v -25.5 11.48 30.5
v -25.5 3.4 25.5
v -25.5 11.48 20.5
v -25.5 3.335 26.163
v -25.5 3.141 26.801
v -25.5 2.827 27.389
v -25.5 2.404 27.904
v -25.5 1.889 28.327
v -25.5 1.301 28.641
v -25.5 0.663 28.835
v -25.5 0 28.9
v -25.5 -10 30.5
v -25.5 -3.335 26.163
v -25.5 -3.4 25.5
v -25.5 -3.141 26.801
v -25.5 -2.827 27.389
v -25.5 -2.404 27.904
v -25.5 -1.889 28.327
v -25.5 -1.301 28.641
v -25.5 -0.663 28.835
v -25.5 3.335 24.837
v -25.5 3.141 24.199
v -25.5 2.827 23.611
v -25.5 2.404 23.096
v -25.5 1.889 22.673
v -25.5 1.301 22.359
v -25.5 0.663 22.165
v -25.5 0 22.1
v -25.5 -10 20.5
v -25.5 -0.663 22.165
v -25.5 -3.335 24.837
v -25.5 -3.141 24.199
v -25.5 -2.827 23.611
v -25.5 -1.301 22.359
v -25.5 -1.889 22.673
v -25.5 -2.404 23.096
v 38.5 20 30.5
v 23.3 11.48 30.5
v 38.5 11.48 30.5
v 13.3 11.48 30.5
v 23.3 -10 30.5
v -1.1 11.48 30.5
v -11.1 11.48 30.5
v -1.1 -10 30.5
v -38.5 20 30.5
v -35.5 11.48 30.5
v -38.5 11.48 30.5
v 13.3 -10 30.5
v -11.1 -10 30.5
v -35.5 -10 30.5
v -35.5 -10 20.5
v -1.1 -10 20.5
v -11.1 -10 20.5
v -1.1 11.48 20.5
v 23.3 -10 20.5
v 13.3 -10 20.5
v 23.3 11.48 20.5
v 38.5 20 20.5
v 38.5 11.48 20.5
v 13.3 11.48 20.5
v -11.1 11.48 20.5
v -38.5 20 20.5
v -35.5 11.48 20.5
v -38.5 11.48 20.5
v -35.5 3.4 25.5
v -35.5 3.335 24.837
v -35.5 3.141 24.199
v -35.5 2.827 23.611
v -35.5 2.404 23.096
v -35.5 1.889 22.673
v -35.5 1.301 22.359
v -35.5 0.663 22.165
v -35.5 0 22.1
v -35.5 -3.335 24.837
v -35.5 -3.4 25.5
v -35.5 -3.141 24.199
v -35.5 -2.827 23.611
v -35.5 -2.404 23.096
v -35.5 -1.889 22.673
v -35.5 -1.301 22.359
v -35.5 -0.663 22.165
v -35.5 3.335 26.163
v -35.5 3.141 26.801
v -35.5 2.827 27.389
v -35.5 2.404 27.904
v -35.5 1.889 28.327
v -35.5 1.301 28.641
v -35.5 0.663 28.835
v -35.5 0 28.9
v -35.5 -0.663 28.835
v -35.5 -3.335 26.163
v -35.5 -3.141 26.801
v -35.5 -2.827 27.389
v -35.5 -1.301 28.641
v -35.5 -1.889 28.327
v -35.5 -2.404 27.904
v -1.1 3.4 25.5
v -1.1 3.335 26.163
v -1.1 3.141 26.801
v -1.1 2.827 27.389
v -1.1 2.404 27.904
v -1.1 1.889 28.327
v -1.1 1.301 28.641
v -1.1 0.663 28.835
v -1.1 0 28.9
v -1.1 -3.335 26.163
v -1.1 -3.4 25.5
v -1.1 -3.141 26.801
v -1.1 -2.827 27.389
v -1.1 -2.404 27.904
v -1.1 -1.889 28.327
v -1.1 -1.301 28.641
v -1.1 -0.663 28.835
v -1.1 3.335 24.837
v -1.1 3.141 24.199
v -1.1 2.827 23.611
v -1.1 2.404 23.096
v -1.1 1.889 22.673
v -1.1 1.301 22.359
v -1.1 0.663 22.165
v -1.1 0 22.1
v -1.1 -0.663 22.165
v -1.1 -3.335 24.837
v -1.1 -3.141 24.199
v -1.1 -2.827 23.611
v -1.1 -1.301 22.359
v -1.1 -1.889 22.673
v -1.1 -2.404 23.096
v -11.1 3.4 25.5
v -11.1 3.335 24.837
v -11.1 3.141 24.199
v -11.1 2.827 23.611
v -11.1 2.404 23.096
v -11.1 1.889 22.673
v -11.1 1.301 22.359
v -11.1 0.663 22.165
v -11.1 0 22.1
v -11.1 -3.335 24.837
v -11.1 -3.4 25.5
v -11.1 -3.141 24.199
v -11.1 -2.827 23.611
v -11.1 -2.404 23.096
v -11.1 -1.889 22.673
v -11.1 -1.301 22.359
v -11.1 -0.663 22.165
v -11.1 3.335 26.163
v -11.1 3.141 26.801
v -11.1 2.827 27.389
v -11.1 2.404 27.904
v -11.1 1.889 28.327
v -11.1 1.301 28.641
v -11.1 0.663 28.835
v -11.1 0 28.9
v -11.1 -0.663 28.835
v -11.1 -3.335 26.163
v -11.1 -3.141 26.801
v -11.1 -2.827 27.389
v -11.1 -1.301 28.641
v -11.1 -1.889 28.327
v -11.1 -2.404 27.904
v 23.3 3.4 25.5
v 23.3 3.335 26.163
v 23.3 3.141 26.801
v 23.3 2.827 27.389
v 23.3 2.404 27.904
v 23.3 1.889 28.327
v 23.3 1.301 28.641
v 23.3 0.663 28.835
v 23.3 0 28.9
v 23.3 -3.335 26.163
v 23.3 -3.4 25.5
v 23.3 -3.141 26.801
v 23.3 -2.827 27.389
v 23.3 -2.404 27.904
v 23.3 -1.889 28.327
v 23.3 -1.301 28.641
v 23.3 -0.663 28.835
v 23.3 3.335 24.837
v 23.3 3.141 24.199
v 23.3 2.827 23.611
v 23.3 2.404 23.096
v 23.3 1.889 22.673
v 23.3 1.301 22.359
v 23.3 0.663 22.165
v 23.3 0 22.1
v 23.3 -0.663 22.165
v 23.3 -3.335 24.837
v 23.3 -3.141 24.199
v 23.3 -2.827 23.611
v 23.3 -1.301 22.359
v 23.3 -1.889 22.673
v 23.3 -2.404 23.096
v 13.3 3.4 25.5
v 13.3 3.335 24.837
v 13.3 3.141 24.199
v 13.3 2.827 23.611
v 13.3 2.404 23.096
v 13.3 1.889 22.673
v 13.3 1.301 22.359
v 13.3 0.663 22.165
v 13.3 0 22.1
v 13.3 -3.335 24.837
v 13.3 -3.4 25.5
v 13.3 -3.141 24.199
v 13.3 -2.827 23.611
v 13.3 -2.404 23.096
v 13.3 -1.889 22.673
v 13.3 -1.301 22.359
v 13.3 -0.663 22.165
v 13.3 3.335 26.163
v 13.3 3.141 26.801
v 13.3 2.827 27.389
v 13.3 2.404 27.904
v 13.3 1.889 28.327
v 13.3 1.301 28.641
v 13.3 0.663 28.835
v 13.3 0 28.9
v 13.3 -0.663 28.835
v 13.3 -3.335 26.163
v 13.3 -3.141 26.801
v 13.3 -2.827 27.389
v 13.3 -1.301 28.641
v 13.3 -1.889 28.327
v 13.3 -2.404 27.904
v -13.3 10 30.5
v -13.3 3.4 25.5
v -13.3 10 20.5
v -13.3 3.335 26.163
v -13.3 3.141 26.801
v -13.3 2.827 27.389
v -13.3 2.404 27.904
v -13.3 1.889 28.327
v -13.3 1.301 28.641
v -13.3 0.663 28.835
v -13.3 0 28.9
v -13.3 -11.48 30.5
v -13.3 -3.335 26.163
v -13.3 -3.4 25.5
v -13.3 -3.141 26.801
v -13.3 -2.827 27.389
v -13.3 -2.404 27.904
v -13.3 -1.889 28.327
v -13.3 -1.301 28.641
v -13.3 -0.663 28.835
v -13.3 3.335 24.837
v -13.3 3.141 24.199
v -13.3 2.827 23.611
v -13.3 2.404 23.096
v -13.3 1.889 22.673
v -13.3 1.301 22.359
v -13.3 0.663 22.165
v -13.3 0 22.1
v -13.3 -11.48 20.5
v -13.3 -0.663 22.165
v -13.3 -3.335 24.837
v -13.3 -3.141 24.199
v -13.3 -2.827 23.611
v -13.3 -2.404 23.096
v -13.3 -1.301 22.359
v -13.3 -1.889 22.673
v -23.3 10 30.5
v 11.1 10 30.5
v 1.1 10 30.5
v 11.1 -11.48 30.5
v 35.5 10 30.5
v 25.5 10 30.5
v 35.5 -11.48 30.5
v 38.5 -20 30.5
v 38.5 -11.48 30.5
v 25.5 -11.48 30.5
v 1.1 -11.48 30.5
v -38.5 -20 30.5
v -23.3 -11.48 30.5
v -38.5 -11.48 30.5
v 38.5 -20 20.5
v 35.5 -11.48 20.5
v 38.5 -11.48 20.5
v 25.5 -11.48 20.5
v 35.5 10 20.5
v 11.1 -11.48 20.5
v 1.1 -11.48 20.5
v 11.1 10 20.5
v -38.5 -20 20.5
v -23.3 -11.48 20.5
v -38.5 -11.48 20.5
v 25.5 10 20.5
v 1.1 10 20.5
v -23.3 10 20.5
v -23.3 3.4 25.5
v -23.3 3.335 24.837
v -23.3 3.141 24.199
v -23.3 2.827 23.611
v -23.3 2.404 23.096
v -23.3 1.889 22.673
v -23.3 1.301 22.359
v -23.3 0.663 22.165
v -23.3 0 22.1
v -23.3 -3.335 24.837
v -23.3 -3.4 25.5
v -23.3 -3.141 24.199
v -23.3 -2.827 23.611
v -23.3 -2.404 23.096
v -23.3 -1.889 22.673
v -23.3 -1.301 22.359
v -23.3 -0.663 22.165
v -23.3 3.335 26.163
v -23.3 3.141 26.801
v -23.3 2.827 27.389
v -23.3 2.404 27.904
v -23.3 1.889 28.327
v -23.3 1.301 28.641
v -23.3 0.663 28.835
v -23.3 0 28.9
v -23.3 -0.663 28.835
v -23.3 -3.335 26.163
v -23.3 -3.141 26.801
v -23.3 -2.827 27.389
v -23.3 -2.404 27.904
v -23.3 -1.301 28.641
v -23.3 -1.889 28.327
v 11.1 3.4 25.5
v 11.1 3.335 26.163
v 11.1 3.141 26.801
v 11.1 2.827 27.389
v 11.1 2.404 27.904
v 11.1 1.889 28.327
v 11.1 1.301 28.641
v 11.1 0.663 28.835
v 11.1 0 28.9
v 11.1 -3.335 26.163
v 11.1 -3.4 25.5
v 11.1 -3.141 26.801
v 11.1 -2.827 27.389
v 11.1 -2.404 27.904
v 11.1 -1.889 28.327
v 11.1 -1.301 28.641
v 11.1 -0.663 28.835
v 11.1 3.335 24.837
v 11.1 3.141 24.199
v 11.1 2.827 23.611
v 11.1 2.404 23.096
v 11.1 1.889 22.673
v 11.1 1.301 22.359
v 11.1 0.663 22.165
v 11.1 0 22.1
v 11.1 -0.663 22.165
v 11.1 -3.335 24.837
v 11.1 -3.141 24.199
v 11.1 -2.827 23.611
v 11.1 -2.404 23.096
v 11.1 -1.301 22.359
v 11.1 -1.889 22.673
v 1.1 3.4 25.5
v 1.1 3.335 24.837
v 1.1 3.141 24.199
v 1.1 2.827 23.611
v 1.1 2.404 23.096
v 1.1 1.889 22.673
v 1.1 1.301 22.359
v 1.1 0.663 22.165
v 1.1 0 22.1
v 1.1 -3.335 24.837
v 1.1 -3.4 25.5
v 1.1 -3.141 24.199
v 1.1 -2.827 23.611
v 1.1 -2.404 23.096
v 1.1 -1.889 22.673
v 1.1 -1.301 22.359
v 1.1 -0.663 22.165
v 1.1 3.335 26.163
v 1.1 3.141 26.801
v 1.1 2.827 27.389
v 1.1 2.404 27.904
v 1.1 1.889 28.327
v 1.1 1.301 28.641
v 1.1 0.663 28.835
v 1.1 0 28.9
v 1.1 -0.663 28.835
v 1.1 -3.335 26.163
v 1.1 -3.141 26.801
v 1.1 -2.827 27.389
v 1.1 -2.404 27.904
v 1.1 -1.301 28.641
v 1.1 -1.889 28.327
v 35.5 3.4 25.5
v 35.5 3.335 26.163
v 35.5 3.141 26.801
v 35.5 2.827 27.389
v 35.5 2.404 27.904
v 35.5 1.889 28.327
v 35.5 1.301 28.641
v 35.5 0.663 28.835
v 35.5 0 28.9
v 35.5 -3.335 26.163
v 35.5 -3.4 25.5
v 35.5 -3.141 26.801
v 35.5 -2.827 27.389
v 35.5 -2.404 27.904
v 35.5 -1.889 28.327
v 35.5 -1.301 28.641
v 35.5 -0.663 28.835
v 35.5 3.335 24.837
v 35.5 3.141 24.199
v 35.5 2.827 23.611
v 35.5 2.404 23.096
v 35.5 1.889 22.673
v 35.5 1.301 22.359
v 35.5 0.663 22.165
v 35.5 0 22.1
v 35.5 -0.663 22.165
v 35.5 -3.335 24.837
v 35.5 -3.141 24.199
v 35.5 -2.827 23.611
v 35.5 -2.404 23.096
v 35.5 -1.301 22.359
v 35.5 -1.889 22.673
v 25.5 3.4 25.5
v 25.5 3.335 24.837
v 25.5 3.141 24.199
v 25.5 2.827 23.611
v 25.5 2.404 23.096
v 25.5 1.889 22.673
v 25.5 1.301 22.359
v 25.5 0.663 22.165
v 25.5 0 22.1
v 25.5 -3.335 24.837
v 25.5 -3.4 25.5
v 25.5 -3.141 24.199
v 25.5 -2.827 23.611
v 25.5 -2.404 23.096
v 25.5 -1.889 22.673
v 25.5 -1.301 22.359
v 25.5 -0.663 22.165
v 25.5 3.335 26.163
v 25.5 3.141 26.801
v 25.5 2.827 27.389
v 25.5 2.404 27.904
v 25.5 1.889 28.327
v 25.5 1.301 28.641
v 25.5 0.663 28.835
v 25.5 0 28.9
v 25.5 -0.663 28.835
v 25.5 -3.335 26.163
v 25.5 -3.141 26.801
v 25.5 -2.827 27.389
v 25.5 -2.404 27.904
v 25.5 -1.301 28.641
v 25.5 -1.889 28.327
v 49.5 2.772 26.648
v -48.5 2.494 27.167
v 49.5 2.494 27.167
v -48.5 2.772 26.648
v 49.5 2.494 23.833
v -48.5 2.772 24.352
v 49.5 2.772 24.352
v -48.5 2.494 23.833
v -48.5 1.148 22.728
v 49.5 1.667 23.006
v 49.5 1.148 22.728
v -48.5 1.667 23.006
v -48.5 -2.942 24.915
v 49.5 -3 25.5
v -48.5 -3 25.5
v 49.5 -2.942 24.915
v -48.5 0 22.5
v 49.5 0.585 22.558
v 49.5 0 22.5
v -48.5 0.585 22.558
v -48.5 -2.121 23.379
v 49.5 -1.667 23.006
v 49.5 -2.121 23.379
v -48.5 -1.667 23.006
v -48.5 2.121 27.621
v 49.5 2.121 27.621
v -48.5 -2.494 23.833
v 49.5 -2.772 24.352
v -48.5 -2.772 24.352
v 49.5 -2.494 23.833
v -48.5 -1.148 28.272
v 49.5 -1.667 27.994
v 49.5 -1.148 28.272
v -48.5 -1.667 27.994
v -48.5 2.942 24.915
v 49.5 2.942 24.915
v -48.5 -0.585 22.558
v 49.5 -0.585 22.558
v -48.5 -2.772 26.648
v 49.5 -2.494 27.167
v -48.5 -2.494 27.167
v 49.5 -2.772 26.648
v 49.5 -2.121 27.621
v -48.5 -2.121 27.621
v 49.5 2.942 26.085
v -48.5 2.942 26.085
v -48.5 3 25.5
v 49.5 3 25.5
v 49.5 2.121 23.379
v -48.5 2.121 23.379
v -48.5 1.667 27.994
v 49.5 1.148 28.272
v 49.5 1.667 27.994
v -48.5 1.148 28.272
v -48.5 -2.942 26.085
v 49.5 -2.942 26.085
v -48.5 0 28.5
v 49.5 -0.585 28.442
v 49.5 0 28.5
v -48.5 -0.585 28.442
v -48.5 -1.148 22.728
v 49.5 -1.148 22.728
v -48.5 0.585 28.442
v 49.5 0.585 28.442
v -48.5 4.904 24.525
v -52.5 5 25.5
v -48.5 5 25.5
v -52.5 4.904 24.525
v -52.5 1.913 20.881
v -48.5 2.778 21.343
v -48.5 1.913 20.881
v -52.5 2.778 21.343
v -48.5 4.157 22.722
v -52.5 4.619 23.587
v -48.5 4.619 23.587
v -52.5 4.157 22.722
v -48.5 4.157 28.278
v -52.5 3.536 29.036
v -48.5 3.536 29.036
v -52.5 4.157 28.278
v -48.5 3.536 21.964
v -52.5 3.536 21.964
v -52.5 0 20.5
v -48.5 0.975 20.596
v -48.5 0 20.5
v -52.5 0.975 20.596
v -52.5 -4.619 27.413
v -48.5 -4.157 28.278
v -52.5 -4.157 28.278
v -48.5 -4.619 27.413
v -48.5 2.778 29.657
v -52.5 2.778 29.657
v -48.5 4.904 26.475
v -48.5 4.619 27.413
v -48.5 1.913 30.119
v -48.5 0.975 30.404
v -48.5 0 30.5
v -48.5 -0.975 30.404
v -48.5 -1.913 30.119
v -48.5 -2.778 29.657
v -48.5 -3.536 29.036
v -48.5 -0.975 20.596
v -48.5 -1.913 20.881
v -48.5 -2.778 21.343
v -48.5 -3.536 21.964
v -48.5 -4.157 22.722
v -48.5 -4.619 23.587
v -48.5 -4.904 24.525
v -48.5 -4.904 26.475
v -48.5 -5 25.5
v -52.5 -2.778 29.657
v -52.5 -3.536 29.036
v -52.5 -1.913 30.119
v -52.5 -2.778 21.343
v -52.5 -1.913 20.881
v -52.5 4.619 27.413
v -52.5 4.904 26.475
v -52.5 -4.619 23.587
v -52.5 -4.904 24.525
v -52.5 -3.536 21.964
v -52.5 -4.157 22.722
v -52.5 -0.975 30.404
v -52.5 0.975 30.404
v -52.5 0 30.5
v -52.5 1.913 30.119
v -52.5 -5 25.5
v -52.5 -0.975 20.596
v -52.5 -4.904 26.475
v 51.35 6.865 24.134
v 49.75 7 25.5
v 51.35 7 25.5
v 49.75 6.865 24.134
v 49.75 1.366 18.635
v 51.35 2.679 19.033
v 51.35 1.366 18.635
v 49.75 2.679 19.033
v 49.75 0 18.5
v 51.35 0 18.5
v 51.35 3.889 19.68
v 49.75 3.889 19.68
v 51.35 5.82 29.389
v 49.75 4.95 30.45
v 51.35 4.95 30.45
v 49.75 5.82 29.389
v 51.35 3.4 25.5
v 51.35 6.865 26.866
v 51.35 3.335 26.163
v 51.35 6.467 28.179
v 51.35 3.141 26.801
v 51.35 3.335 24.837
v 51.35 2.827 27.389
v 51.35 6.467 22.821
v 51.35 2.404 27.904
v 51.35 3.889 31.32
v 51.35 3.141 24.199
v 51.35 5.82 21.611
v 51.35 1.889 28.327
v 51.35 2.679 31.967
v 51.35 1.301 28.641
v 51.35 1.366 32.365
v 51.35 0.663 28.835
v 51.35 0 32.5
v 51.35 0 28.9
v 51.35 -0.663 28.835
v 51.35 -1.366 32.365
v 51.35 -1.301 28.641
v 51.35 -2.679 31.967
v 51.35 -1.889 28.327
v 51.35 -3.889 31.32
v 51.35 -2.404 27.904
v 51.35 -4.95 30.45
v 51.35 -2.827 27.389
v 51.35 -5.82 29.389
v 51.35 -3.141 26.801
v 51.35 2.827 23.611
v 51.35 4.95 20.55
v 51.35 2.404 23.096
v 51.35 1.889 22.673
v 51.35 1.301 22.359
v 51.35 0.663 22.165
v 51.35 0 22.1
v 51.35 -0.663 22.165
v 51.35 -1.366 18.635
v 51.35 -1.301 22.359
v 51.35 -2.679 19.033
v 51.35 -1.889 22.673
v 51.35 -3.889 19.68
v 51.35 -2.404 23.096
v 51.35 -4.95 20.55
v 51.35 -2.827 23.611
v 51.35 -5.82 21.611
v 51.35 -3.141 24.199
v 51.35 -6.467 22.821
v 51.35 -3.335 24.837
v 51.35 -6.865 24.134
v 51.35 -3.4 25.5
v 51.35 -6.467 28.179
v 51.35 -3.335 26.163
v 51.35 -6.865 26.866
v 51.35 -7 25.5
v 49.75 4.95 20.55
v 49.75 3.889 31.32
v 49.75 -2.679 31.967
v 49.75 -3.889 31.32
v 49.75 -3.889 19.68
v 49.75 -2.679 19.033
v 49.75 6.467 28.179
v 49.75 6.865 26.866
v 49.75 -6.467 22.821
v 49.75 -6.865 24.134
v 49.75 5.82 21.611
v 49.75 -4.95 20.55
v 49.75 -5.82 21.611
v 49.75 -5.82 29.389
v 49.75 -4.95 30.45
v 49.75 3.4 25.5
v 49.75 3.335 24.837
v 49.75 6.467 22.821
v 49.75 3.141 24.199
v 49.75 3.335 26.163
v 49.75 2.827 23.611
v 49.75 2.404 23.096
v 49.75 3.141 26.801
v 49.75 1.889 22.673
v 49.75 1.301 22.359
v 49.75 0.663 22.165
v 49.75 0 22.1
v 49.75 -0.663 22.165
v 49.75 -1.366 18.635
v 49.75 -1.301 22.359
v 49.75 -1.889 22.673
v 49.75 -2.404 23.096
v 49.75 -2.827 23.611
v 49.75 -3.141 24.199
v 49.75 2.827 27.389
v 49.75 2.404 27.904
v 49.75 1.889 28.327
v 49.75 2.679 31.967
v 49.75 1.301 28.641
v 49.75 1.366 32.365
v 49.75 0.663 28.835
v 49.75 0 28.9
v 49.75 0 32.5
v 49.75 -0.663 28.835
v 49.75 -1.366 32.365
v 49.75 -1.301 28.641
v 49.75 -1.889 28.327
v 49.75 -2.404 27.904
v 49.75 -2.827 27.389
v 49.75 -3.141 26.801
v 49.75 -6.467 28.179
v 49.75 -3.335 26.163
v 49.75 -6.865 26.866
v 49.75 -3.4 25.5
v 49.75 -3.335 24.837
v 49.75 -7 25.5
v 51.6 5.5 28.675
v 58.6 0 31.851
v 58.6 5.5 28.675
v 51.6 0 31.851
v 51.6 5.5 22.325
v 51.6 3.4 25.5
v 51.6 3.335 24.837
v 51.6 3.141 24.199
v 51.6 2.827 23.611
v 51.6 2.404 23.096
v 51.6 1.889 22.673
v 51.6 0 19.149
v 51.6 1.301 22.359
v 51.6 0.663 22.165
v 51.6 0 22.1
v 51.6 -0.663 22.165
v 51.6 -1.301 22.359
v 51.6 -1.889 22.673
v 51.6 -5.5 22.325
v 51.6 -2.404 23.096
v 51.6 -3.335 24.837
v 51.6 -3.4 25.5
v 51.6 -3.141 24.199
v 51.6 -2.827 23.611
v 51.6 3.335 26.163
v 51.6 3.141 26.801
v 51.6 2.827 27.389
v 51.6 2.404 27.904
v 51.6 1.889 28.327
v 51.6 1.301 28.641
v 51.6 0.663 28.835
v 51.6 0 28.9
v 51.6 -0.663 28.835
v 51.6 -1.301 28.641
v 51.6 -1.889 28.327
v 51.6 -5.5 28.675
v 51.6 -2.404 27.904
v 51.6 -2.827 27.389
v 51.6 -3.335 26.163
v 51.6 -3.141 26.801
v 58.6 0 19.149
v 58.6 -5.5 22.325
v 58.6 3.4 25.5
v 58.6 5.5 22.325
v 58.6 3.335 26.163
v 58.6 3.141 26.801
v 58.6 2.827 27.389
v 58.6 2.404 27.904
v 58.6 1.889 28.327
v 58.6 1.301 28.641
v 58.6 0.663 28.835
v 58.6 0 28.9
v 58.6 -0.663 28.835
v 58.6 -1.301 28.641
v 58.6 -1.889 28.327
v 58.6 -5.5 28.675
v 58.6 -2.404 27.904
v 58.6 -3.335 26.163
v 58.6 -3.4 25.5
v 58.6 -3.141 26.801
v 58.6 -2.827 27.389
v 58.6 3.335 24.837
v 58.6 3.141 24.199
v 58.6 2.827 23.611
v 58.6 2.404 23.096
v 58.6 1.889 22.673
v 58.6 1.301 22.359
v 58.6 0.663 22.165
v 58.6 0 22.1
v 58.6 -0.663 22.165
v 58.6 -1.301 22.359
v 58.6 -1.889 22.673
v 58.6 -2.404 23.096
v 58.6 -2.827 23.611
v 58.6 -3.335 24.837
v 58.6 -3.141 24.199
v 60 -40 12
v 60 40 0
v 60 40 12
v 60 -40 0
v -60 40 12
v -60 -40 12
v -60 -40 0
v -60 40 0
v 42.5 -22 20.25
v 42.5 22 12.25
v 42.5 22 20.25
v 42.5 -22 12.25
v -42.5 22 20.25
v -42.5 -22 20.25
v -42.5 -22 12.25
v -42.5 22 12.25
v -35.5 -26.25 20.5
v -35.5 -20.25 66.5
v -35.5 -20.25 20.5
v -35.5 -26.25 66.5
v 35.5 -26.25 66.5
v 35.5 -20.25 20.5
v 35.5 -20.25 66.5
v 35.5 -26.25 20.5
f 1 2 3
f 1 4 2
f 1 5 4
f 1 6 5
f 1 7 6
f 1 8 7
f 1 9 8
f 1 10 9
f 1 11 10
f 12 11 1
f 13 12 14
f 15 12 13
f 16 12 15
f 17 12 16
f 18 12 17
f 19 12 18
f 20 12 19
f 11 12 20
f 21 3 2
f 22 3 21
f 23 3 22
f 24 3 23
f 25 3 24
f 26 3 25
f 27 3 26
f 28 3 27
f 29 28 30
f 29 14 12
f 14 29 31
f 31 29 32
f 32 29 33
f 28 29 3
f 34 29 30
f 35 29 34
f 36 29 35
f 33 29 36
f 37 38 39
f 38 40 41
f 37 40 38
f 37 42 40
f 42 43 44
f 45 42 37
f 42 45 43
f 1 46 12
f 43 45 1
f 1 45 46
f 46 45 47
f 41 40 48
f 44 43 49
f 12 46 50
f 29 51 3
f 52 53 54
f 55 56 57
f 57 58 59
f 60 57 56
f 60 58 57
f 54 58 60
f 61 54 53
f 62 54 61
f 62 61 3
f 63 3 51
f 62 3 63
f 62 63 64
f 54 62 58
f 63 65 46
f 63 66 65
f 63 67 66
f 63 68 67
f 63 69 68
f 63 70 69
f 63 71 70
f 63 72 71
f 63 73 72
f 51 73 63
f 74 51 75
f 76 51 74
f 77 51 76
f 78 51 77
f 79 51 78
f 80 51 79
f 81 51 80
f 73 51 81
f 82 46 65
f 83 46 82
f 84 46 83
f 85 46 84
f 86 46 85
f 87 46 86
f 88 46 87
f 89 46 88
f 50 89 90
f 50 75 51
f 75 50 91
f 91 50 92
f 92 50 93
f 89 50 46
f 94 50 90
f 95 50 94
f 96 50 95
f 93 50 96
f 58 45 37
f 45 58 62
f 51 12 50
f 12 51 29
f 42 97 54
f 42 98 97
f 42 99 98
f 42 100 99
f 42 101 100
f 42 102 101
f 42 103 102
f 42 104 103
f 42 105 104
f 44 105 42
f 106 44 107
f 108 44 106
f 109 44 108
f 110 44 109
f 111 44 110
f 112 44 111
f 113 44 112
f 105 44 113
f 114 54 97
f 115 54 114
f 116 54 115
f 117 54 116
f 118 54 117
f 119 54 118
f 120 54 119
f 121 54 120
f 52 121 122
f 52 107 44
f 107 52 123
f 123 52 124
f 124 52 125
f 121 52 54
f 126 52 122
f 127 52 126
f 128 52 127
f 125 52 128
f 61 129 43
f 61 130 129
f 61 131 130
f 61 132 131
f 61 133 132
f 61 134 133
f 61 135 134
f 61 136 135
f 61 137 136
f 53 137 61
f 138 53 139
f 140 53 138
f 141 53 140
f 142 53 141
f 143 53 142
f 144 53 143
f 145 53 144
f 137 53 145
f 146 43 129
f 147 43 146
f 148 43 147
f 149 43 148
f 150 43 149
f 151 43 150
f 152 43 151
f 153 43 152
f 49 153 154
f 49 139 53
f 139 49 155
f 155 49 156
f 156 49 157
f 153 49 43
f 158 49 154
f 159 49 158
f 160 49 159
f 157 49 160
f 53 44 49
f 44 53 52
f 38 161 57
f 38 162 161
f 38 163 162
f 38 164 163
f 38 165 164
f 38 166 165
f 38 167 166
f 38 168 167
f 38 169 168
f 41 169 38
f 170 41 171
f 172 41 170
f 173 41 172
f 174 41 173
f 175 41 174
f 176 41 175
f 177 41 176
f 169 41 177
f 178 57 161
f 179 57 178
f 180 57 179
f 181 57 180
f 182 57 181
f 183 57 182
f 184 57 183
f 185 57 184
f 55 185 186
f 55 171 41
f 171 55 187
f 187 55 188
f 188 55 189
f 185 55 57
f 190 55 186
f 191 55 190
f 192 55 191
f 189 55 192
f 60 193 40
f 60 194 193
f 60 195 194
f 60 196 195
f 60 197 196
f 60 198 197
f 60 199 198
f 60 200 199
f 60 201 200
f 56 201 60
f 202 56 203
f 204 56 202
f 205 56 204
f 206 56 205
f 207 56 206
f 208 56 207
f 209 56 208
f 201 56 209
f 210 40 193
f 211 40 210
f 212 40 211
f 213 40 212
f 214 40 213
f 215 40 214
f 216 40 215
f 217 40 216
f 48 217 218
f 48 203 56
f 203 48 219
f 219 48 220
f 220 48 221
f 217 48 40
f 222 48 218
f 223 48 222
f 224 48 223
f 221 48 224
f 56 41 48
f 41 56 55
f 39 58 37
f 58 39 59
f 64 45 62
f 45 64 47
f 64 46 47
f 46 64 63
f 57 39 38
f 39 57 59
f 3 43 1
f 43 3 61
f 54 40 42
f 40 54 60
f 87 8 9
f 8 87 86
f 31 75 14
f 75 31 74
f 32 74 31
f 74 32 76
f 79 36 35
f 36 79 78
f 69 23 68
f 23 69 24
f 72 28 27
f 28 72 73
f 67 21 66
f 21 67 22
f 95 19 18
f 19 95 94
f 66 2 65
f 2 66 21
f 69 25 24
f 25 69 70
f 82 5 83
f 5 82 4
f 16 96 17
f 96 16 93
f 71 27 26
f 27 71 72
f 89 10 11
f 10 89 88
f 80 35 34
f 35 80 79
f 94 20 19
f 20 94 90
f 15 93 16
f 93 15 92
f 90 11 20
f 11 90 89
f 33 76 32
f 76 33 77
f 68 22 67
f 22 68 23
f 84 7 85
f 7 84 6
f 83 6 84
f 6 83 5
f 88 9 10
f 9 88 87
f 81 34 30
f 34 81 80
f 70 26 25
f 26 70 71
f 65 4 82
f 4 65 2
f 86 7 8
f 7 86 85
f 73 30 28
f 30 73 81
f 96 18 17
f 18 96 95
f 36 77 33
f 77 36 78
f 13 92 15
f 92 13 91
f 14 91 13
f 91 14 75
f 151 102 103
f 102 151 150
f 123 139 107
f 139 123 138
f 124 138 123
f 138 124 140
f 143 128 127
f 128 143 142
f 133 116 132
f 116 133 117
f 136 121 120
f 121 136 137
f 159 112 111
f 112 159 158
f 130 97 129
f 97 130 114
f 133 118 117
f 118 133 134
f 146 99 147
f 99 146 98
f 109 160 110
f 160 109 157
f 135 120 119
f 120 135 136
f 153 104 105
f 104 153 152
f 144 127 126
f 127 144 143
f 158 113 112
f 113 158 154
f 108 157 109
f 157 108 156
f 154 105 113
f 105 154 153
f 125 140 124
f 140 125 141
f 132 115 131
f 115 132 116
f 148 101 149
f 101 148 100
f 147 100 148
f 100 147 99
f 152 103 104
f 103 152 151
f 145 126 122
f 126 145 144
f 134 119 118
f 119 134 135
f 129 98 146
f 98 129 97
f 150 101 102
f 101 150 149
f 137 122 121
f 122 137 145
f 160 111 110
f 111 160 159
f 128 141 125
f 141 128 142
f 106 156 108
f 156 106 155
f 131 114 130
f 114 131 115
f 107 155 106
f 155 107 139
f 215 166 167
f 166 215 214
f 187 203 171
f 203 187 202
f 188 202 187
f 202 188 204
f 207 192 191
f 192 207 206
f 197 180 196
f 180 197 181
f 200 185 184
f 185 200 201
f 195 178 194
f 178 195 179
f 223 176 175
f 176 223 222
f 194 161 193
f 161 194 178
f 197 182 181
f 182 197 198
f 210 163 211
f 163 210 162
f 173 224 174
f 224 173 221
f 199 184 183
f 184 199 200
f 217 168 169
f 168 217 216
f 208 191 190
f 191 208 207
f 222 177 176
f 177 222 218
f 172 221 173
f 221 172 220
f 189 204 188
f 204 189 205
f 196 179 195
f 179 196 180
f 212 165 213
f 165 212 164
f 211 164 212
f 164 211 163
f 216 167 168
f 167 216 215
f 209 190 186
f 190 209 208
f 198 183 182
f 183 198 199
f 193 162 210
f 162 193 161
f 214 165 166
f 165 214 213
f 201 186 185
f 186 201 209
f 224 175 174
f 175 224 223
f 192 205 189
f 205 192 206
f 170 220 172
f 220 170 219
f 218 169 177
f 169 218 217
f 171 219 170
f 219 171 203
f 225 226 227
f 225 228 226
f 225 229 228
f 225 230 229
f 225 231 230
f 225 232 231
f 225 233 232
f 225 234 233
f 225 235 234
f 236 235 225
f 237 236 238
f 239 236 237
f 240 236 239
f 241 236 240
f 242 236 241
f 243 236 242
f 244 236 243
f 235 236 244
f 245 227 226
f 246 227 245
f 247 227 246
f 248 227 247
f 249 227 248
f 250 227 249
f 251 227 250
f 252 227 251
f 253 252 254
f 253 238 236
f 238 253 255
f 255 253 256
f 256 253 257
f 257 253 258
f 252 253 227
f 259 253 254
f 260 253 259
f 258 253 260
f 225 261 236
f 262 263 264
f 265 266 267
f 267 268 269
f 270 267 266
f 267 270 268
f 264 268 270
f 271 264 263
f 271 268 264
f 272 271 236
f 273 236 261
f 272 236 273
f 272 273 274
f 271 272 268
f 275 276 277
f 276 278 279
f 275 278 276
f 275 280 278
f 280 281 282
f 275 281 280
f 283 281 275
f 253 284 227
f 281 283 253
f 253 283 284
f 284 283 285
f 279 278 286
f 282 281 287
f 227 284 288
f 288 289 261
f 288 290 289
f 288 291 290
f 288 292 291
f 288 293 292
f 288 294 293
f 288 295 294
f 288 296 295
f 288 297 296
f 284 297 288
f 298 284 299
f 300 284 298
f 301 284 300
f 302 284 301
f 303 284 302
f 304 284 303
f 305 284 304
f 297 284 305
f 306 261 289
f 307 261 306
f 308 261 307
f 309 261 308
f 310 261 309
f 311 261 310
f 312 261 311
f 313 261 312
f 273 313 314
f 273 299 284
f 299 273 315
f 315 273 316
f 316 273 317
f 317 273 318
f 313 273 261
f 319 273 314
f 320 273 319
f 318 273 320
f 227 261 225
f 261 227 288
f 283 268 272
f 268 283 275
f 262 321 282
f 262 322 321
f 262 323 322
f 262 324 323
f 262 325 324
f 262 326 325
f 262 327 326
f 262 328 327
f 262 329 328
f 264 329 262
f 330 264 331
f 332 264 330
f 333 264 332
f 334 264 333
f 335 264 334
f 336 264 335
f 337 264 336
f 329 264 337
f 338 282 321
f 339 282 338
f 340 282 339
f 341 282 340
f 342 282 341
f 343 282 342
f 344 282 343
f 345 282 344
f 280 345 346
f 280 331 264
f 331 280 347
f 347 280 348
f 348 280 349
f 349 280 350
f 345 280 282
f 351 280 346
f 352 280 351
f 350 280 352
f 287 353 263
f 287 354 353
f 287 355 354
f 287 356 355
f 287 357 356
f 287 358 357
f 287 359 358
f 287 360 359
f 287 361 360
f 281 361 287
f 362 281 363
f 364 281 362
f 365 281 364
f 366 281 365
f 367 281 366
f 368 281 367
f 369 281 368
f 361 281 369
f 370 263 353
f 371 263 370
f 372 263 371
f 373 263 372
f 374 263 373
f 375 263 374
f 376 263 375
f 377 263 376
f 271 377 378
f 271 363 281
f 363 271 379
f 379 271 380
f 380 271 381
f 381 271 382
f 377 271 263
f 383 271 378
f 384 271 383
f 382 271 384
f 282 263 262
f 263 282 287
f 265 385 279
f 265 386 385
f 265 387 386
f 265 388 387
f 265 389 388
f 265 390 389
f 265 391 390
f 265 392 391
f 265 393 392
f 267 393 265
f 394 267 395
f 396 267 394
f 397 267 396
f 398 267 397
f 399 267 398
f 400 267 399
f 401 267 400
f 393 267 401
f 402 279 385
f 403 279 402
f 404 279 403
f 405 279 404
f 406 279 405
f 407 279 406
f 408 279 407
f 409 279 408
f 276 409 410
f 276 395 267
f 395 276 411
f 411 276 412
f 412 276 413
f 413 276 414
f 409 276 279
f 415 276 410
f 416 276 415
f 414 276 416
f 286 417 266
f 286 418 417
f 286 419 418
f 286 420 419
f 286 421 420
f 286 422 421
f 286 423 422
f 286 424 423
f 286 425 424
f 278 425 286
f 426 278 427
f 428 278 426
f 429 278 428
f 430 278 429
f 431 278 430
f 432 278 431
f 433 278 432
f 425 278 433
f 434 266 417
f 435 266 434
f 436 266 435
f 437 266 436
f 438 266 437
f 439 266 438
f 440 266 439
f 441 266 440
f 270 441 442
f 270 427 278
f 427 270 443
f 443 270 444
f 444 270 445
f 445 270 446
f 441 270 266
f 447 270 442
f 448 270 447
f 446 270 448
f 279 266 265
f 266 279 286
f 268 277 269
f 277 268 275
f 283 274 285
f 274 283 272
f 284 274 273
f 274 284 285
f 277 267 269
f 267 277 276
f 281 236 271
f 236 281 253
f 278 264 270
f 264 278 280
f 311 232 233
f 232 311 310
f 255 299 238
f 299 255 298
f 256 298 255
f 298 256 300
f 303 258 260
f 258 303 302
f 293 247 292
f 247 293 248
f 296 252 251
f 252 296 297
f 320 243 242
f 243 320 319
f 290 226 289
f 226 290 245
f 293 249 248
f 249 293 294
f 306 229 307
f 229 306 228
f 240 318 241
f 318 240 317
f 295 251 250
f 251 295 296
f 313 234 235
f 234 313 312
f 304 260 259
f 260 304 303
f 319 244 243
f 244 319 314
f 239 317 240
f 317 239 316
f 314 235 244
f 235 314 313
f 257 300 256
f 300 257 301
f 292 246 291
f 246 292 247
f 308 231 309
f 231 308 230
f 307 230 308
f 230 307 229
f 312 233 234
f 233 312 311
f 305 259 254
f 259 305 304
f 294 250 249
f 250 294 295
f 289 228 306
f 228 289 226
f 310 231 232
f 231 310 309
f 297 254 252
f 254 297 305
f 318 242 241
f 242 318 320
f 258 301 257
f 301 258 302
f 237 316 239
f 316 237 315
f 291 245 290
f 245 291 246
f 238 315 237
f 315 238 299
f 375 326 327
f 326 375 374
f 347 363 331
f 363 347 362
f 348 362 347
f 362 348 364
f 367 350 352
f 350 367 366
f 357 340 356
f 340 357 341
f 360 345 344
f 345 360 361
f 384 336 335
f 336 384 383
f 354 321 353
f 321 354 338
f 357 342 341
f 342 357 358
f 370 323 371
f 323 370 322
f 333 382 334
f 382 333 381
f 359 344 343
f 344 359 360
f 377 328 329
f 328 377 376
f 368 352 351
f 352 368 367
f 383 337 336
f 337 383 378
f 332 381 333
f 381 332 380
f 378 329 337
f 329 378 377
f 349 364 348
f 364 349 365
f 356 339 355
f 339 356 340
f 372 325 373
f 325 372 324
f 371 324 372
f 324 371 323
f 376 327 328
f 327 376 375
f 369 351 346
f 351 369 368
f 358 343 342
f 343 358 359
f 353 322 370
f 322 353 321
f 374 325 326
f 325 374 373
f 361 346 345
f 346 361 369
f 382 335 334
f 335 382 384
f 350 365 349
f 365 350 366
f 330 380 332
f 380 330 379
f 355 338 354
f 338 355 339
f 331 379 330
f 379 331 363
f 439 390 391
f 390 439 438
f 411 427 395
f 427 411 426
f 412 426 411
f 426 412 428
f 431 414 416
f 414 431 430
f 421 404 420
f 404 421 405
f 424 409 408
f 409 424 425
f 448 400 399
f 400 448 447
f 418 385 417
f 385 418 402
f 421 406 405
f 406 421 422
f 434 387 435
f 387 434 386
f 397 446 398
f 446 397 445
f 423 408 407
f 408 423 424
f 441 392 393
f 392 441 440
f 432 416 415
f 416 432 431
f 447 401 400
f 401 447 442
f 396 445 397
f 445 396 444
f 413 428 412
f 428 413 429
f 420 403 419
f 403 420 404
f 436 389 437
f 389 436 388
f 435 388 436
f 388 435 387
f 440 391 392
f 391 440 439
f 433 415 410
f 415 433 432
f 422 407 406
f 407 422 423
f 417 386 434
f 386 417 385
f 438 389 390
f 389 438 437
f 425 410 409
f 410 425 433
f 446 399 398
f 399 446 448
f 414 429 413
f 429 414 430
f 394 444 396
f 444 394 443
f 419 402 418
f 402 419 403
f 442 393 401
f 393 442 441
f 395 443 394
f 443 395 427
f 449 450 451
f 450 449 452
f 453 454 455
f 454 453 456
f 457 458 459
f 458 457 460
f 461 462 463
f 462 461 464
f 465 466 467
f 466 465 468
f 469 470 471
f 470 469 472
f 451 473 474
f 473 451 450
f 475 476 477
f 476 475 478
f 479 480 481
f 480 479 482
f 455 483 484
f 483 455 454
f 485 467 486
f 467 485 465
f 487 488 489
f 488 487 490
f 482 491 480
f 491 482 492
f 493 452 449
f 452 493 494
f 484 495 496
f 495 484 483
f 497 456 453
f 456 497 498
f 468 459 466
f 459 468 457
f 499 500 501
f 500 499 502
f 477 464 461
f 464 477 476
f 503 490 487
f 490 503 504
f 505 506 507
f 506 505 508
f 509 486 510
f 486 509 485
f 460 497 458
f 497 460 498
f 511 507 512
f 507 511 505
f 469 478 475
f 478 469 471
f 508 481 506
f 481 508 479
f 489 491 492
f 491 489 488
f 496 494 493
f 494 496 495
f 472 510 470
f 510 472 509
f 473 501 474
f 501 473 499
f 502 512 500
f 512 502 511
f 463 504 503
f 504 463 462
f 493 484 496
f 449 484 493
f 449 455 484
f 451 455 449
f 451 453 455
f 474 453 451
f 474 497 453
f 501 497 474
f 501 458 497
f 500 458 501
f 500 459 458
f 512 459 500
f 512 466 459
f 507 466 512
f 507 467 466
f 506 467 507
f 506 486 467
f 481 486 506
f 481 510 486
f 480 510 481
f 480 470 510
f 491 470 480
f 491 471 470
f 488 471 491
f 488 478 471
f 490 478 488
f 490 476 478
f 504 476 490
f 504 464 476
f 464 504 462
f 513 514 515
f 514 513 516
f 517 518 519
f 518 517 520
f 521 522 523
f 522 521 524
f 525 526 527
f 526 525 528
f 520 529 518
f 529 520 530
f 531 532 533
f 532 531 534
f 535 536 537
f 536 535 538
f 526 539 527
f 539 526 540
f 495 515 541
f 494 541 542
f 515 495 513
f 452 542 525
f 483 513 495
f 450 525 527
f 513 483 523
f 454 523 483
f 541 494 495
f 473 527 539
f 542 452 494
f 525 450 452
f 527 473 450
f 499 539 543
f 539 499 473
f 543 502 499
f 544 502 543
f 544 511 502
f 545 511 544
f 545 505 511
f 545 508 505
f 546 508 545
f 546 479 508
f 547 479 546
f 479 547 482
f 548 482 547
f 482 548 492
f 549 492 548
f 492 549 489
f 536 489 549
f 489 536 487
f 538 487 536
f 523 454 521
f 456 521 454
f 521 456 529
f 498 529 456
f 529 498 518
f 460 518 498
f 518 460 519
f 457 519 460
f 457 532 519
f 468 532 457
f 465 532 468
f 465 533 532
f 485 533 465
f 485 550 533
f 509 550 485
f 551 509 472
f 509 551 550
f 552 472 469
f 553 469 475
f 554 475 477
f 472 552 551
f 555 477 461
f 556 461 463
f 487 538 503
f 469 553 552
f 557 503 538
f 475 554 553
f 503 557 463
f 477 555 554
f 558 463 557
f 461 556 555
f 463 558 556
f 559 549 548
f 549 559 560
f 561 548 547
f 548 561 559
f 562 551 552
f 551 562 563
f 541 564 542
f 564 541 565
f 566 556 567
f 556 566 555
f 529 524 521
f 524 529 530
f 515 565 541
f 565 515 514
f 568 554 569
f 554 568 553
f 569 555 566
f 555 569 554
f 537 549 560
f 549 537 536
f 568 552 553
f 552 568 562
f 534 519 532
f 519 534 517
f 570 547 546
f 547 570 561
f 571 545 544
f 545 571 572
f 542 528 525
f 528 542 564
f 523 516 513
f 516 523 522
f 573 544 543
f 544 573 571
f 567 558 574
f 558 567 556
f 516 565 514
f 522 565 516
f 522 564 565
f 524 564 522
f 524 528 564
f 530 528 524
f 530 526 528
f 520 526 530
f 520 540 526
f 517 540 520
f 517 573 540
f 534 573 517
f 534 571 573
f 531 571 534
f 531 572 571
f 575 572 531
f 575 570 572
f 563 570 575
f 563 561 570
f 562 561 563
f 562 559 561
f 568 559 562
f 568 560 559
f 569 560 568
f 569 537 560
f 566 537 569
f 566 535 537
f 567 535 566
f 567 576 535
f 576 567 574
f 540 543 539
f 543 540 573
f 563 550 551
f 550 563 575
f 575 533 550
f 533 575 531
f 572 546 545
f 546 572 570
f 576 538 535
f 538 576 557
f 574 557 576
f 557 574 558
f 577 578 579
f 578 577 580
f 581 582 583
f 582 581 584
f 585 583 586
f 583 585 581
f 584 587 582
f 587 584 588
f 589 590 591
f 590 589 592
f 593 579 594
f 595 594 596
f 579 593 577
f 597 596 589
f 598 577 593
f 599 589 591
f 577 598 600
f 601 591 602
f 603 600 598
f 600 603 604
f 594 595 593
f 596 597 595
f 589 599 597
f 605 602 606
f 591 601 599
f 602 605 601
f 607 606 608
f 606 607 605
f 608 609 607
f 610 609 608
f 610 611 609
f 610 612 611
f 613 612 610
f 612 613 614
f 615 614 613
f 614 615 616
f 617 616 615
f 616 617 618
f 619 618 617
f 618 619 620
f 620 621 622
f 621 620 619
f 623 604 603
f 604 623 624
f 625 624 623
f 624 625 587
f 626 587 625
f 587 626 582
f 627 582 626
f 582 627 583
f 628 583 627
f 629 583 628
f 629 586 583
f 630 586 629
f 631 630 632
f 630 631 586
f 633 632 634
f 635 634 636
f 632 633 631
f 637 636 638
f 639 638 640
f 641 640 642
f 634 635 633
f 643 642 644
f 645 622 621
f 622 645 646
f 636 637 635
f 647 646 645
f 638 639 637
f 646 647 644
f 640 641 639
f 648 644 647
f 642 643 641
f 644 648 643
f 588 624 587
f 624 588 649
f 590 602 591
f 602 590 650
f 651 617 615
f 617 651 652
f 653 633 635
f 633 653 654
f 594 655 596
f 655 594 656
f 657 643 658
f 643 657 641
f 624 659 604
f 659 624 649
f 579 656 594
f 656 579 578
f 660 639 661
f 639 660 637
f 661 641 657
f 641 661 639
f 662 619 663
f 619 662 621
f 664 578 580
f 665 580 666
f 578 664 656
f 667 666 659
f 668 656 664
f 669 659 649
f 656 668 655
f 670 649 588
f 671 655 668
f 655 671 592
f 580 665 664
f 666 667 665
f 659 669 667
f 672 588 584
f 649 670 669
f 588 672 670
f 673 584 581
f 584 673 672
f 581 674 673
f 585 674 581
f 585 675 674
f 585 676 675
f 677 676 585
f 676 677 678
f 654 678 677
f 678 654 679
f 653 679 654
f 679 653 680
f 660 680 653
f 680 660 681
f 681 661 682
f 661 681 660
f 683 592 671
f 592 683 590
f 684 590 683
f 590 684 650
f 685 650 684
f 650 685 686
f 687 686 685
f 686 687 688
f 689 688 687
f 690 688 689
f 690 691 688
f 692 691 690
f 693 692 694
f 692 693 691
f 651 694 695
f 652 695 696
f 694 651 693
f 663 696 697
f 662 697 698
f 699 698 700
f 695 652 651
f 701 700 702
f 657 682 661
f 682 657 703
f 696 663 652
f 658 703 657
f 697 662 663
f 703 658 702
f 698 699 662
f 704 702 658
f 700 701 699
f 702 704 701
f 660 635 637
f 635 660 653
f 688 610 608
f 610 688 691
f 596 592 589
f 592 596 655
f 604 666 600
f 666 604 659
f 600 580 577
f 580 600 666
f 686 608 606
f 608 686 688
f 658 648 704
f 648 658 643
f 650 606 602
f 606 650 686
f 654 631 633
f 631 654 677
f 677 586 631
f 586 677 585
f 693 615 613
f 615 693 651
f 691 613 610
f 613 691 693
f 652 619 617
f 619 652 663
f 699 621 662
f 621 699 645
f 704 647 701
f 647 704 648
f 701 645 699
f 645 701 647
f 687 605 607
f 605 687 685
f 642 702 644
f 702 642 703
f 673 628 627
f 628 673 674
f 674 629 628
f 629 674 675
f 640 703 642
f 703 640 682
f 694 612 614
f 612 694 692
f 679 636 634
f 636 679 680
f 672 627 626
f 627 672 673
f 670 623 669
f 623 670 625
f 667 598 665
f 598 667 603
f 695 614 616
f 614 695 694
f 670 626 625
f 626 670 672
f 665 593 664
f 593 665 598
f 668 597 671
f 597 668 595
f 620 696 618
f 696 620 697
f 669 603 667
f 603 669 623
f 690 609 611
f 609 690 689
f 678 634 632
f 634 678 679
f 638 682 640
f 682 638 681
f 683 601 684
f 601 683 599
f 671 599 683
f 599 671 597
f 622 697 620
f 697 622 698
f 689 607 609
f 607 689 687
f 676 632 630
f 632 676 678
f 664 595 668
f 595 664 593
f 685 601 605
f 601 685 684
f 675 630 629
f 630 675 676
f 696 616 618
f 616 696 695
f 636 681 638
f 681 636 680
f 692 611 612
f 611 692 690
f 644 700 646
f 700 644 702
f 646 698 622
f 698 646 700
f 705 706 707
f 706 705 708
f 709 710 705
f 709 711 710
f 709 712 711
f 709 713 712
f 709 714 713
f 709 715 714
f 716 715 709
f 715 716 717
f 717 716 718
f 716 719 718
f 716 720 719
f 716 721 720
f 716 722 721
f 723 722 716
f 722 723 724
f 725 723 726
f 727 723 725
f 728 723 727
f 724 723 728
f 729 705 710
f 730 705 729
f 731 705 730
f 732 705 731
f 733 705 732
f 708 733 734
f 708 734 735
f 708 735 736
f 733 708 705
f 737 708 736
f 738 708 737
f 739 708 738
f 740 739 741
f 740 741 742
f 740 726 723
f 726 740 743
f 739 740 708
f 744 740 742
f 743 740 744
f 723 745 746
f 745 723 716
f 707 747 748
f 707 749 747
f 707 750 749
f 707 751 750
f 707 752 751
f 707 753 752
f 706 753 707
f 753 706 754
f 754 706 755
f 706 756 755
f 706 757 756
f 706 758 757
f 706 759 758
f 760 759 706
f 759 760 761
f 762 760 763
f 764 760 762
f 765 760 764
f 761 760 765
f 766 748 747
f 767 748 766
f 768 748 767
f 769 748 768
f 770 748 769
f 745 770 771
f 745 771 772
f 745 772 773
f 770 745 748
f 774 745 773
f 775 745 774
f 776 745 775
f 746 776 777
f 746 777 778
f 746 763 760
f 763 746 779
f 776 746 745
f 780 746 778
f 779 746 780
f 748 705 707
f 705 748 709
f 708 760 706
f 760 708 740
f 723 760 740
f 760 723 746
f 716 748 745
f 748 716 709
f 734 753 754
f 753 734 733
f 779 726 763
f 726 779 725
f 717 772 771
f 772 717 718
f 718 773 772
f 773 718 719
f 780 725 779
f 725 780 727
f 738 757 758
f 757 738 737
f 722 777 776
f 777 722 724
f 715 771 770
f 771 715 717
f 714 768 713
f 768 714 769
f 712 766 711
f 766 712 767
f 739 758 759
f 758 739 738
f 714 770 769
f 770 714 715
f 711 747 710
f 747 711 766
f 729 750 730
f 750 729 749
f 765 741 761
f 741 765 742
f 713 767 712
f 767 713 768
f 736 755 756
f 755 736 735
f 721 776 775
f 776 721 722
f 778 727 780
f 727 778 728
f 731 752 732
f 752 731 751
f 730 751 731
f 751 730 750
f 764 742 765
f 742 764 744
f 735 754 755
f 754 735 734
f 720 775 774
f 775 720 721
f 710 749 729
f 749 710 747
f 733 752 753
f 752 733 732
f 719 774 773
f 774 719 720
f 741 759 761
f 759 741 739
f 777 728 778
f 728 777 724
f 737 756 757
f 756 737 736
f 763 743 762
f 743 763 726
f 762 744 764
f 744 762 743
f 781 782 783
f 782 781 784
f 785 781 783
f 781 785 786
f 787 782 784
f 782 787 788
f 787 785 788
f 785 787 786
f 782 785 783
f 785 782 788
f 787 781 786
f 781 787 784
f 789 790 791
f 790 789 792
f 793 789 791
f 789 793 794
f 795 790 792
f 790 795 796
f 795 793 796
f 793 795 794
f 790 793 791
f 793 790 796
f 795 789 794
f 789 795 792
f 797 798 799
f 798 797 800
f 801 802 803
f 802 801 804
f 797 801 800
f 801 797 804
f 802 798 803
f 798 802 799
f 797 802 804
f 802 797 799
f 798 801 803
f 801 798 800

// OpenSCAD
$fn = 32;

// ------------------------------------------------------------------------
// Comb hinge with flap: leaf 77 x 20 mm, pin d6, flap 46 mm
// Every part is its own module, assembly() places every instance.
// ------------------------------------------------------------------------

// --- part 1 ---
module hinge_bed() {
  difference() {
    translate([-60, -40, 0]) cube([120, 80, 12]);
  }
}

// --- part 2 ---
module hinge_riser() {
  difference() {
    translate([-42.5, -22, 0]) cube([85, 44, 8]);
  }
}

// --- part 3 ---
module hinge_leaf_a() {
  difference() {
    union() {
      translate([-35.5, -10, -5]) cube([10, 30, 10]);
      translate([-11.1, -10, -5]) cube([10, 30, 10]);
      translate([13.3, -10, -5]) cube([10, 30, 10]);
      translate([-38.5, 11.48, -5]) cube([77, 8.52, 10]);
    }
    translate([-30.5, 0, 0]) rotate([0, 90, 0]) cylinder(h = 12, d = 6.8, center = true);
    translate([-6.1, 0, 0]) rotate([0, 90, 0]) cylinder(h = 12, d = 6.8, center = true);
    translate([18.3, 0, 0]) rotate([0, 90, 0]) cylinder(h = 12, d = 6.8, center = true);
  }
}

// --- part 4 ---
module hinge_leaf_b() {
  difference() {
    union() {
      translate([-23.3, -20, -5]) cube([10, 30, 10]);
      translate([1.1, -20, -5]) cube([10, 30, 10]);
      translate([25.5, -20, -5]) cube([10, 30, 10]);
      translate([-38.5, -20, -5]) cube([77, 8.52, 10]);
    }
    translate([-18.3, 0, 0]) rotate([0, 90, 0]) cylinder(h = 12, d = 6.8, center = true);
    translate([6.1, 0, 0]) rotate([0, 90, 0]) cylinder(h = 12, d = 6.8, center = true);
    translate([30.5, 0, 0]) rotate([0, 90, 0]) cylinder(h = 12, d = 6.8, center = true);
  }
}

// --- part 5 ---
module hinge_flap() {
  difference() {
    translate([-35.5, -23, 0]) cube([71, 46, 6]);
  }
}

// --- part 6 ---
module hinge_pin() {
  rotate([0, 90, 0]) cylinder(h = 99, d = 6, center = true);
  translate([-52.5, 0, 0]) rotate([0, 90, 0]) cylinder(h = 4, d = 10);
}

// --- part 7 ---
module pin_washer() {
  difference() {
      translate([0, 0, 0]) cylinder(h = 1.6, d = 14);
      translate([0, 0, -1]) cylinder(h = 3.6, d = 6.8);
    }
}

// --- part 8 ---
module pin_nut() {
  difference() {
    linear_extrude(height = 7) polygon(points = [[6.351, 0], [3.175, 5.5], [-3.175, 5.5], [-6.351, 0], [-3.175, -5.5], [3.175, -5.5]]);
    translate([0, 0, -1]) cylinder(h = 9, d = 6.8);
  }
}

// --- assembly ---
module assembly() {
  color([0.80, 0.24, 0.20]) translate([0, 0, 0]) rotate([0, 0, 0]) hinge_bed();
  color([0.20, 0.45, 0.75]) translate([0, 0, 12.25]) rotate([0, 0, 0]) hinge_riser();
  color([0.25, 0.62, 0.32]) translate([0, 0, 25.5]) rotate([0, 0, 0]) hinge_leaf_a();
  color([0.92, 0.70, 0.18]) translate([0, 0, 25.5]) rotate([0, 0, 0]) hinge_leaf_b();
  color([0.58, 0.35, 0.70]) translate([0, -20.25, 43.5]) rotate([90, 0, 0]) hinge_flap();
  color([0.16, 0.66, 0.66]) translate([0, 0, 25.5]) rotate([0, 0, 0]) hinge_pin();
  color([0.85, 0.48, 0.18]) translate([49.75, 0, 25.5]) rotate([0, 90, 0]) pin_washer();
  color([0.55, 0.60, 0.65]) translate([51.6, 0, 25.5]) rotate([0, 90, 0]) pin_nut();
}

assembly();
